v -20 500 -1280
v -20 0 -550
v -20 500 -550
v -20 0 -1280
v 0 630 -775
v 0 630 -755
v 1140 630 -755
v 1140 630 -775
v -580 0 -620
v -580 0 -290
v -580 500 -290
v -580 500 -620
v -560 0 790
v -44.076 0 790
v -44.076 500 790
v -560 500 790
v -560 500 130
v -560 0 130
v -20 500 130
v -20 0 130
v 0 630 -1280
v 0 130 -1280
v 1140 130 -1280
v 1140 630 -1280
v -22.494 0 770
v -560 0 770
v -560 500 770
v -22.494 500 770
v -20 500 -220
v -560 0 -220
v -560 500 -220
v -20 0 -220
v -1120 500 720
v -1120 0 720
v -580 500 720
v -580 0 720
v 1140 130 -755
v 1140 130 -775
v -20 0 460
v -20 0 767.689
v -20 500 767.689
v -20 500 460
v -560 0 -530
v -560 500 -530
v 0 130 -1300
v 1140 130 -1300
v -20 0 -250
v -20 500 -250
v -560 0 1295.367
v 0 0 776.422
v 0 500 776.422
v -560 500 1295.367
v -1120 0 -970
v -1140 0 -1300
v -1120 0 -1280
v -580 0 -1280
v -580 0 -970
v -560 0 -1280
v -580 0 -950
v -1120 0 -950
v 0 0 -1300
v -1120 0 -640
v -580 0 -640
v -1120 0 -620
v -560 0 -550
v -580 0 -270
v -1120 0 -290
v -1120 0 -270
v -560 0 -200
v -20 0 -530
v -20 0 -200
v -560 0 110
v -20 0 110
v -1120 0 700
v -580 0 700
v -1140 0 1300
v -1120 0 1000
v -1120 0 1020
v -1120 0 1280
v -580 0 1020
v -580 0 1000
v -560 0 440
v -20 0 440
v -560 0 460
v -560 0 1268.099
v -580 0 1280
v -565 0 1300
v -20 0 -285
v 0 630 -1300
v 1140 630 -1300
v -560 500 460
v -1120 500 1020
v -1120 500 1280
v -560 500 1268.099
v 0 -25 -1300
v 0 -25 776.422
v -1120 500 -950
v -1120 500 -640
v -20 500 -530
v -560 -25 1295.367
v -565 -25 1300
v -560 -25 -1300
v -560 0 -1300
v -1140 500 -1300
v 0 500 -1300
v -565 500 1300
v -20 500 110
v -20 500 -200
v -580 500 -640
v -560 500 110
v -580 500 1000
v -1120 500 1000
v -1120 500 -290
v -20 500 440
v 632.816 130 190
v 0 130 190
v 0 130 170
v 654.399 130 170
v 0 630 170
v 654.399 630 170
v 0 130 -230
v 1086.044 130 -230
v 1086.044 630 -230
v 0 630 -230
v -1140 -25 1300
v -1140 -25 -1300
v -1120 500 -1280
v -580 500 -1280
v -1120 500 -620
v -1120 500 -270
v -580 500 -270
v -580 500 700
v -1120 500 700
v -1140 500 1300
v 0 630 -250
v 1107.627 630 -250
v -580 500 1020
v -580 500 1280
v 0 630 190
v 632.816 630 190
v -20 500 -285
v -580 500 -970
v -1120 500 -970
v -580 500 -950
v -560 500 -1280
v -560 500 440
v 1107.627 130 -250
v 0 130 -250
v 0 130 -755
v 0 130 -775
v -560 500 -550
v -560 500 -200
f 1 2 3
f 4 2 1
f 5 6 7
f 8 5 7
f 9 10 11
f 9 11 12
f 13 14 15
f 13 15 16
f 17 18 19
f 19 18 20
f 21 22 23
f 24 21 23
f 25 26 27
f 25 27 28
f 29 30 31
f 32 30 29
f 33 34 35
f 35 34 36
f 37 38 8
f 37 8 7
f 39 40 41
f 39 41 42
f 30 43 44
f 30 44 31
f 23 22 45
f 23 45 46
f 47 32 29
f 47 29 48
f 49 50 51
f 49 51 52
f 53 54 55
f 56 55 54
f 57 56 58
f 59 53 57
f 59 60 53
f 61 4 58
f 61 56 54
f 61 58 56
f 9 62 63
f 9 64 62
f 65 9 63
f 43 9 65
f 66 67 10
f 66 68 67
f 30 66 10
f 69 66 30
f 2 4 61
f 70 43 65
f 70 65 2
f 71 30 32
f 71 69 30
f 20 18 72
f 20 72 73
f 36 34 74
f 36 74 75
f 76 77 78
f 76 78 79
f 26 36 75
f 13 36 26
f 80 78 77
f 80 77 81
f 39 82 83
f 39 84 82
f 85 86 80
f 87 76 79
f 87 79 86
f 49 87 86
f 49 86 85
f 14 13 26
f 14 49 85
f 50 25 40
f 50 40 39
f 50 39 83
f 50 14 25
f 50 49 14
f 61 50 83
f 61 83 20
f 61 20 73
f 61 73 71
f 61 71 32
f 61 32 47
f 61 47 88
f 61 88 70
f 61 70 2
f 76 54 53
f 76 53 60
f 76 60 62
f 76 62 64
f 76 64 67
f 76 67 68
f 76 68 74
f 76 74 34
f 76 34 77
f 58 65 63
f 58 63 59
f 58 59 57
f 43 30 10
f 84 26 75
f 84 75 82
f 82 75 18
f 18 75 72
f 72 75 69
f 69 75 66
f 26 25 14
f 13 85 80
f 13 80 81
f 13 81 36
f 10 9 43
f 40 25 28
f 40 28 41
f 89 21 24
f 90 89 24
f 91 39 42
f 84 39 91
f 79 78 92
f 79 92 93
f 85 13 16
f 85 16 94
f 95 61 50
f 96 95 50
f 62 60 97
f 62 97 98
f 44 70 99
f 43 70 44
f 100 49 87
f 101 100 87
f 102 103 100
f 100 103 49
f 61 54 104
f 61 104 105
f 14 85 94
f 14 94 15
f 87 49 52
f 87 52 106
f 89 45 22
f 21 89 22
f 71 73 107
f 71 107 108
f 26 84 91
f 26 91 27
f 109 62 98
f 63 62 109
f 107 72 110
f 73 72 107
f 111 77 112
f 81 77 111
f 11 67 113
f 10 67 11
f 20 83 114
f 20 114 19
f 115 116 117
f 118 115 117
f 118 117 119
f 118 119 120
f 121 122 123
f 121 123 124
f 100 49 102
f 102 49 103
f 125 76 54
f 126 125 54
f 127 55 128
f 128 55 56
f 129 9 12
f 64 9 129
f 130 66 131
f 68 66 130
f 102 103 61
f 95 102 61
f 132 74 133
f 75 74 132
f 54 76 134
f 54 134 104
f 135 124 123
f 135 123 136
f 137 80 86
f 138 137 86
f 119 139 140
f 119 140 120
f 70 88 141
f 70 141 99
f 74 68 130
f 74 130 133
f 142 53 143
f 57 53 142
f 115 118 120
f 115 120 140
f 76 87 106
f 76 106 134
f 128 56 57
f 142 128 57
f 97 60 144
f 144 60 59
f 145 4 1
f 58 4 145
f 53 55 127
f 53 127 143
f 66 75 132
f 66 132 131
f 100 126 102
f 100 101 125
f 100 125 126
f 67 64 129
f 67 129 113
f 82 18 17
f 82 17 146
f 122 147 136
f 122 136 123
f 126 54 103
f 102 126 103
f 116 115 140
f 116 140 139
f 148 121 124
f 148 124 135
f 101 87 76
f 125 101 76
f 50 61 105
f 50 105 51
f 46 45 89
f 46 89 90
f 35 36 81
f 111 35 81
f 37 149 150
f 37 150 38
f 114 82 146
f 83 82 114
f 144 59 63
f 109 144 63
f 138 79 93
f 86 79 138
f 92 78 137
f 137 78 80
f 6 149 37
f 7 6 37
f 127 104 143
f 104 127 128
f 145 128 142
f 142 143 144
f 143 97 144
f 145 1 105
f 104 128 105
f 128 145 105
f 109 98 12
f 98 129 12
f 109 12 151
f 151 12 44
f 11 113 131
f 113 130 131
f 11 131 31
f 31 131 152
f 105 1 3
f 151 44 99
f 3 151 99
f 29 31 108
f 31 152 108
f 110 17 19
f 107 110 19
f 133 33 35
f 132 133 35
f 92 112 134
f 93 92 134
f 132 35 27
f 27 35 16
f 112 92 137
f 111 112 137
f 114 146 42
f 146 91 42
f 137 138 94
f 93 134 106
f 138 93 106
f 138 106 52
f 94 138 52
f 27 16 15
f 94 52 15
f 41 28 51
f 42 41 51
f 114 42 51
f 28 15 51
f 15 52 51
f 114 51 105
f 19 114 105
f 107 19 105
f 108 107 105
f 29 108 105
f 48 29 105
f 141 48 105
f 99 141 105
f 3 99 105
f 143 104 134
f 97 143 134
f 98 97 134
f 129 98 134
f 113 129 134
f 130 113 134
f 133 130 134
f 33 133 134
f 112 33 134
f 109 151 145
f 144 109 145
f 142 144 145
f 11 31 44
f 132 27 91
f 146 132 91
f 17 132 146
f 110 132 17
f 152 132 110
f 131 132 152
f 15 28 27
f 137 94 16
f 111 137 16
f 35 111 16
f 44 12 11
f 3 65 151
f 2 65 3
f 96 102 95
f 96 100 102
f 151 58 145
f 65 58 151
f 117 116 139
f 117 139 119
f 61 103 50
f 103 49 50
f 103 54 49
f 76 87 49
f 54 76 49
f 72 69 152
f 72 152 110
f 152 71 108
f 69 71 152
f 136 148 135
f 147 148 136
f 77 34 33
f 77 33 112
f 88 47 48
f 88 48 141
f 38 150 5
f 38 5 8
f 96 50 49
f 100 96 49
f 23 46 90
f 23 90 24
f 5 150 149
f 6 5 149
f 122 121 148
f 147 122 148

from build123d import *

# Parameters (mm, degrees)
F0_W     = 540
F0_H     = 310
F0_H_2   = 280
F0_H_3   = 260
F0_H_4   = 20
F1_DEPTH = 500
F0_H_5   = 920
F0_H_6   = 275
F0_H_7   = 35
F0_H_8   = 30
F2_DEPTH = 25
F0_H_9   = 250
F0_H_10  = 230
F3_DEPTH = 25
F4_START = -130
F4_DEPTH = 500
F0_W_2   = 1140
F0_H_11  = 20.0000000002


# Not quite as in the source:
# - a feature names something its author has since deleted; it is built from what else it names


with BuildPart() as f1:
    # F0 (on Front) → F1 (new body)
    with BuildSketch(Plane.XZ):
        Polygon((-1140, -1300), (-560, -1300), (-560, -1280), (-560, -1050), (-560, -800), (-560, -550), (-560, -530), (-560, -220), (-560, -200), (-560, 110), (-560, 130), (-560, 440), (-560, 460), (-560, 770), (-560, 790), (-560, 1268.0993919815), (-560, 1295.366568915), (-565, 1300), (-1140, 1300), align=None)
        with Locations((-850, -1125)):
            Rectangle(F0_W, F0_H, mode=Mode.SUBTRACT)
        with Locations((-850, -795)):
            Rectangle(F0_W, F0_H, mode=Mode.SUBTRACT)
        Polygon((-580, -290), (-580, -325), (-580, -345), (-580, -620), (-1120, -620), (-1120, -345), (-1120, -325), (-1120, -290), align=None, mode=Mode.SUBTRACT)
        Polygon((-1120, 700), (-580, 700), (-580, 670), (-580, 650), (-580, -270), (-1120, -270), (-1120, 650), (-1120, 670), align=None, mode=Mode.SUBTRACT)
        with Locations((-850, 860)):
            Rectangle(F0_W, F0_H_2, mode=Mode.SUBTRACT)
        with Locations((-850, 1150)):
            Rectangle(F0_W, F0_H_3, mode=Mode.SUBTRACT)
        Polygon((-20.0000000001, -250), (0, -250), (0, -230), (0, 170), (0, 190), (0, 776.4222873899), (-560, 1295.366568915), (-560, 1268.0993919815), (-44.0762890327, 790), (-560, 790), (-560, 770), (-22.4940105517, 770), (-20, 767.6888347967), (-20, 720), (-20, 700), (-20, 460), (-560, 460), (-560, 440), (-20, 440), (-20, 374.9999928474), (-20, 354.9999928474), (-20, 130), (-20, 110), (-20, -200), (-560, -200), (-560, -220), (-20, -220), align=None)
        with Locations((-290, 120)):
            Rectangle(F0_W, F0_H_4)
        Polygon((-560, -1300), (0, -1300), (0, -1280), (0, -775), (0, -755), (0, -250), (-20.0000000001, -250), (-20, -285.0000071528), (-20, -305.0000071528), (-20, -530), (-560, -530), (-560, -550), (-20, -550), (-20, -800), (-20, -1050), (-20, -1280), (-560, -1280), align=None)
    extrude(amount=-F1_DEPTH)


with BuildPart() as f2:
    # F0 (on Front) → F2 (new body)
    with BuildSketch(Plane.XZ):
        Polygon((-1140, -1300), (-560, -1300), (-560, -1280), (-560, -1050), (-560, -800), (-560, -550), (-560, -530), (-560, -220), (-560, -200), (-560, 110), (-560, 130), (-560, 440), (-560, 460), (-560, 770), (-560, 790), (-560, 1268.0993919815), (-560, 1295.366568915), (-565, 1300), (-1140, 1300), align=None)
        with Locations((-850, -1125)):
            Rectangle(F0_W, F0_H, mode=Mode.SUBTRACT)
        with Locations((-850, -795)):
            Rectangle(F0_W, F0_H, mode=Mode.SUBTRACT)
        Polygon((-580, -290), (-580, -325), (-580, -345), (-580, -620), (-1120, -620), (-1120, -345), (-1120, -325), (-1120, -290), align=None, mode=Mode.SUBTRACT)
        Polygon((-1120, 700), (-580, 700), (-580, 670), (-580, 650), (-580, -270), (-1120, -270), (-1120, 650), (-1120, 670), align=None, mode=Mode.SUBTRACT)
        with Locations((-850, 860)):
            Rectangle(F0_W, F0_H_2, mode=Mode.SUBTRACT)
        with Locations((-850, 1150)):
            Rectangle(F0_W, F0_H_3, mode=Mode.SUBTRACT)
        with Locations((-850, 190)):
            Rectangle(F0_W, F0_H_5)
        with Locations((-850, -795)):
            Rectangle(F0_W, F0_H)
        with Locations((-850, -1125)):
            Rectangle(F0_W, F0_H)
        with Locations((-850, 860)):
            Rectangle(F0_W, F0_H_2)
        with Locations((-850, -482.5)):
            Rectangle(F0_W, F0_H_6)
        with Locations((-850, 1150)):
            Rectangle(F0_W, F0_H_3)
        with Locations((-850, -307.5)):
            Rectangle(F0_W, F0_H_7)
        with Locations((-850, 685)):
            Rectangle(F0_W, F0_H_8)
        with Locations((-850, 660)):
            Rectangle(F0_W, F0_H_4)
        with Locations((-850, -335)):
            Rectangle(F0_W, F0_H_4)
    extrude(amount=F2_DEPTH)


with BuildPart() as f3:
    # F0 (on Front) → F3 (new body)
    with BuildSketch(Plane.XZ):
        Polygon((-44.0762890327, 790), (-560, 1268.0993919815), (-560, 790), align=None)
        Polygon((-560, -1300), (0, -1300), (0, -1280), (0, -775), (0, -755), (0, -250), (-20.0000000001, -250), (-20, -285.0000071528), (-20, -305.0000071528), (-20, -530), (-560, -530), (-560, -550), (-20, -550), (-20, -800), (-20, -1050), (-20, -1280), (-560, -1280), align=None)
        with Locations((-290, -675)):
            Rectangle(F0_W, F0_H_9)
        with Locations((-290, -925)):
            Rectangle(F0_W, F0_H_9)
        with Locations((-290, -1165)):
            Rectangle(F0_W, F0_H_10)
        Polygon((-20, -285.0000071528), (-20, -250), (-20, -220), (-560, -220), (-560, -530), (-20, -530), (-20, -305.0000071528), align=None)
        Polygon((-20.0000000001, -250), (0, -250), (0, -230), (0, 170), (0, 190), (0, 776.4222873899), (-560, 1295.366568915), (-560, 1268.0993919815), (-44.0762890327, 790), (-560, 790), (-560, 770), (-22.4940105517, 770), (-20, 767.6888347967), (-20, 720), (-20, 700), (-20, 460), (-560, 460), (-560, 440), (-20, 440), (-20, 374.9999928474), (-20, 354.9999928474), (-20, 130), (-20, 110), (-20, -200), (-560, -200), (-560, -220), (-20, -220), align=None)
        with Locations((-290, -45)):
            Rectangle(F0_W, F0_H)
        with Locations((-290, 120)):
            Rectangle(F0_W, F0_H_4)
        Polygon((-20, 440), (-560, 440), (-560, 130), (-20, 130), (-20, 354.9999928474), (-20, 374.9999928474), align=None)
        Polygon((-22.4940105517, 770), (-560, 770), (-560, 460), (-20, 460), (-20, 700), (-20, 720), (-20, 767.6888347967), align=None)
    extrude(amount=F3_DEPTH)


with BuildPart() as f4:
    # F0 (on Front) → F4 (new body)
    with BuildSketch(Plane.XZ.offset(F4_START)):
        Polygon((0, 190), (0, 170), (654.3987341771, 169.9999999999), (632.8164556961, 189.9999999999), align=None)
    extrude(amount=-F4_DEPTH)


with BuildPart() as f4b:
    # F0 (on Front) → F4, piece 2 (new body)
    with BuildSketch(Plane.XZ.offset(F4_START)):
        Polygon((0, -230), (0, -250), (1107.6265822783, -250.0000000001), (1086.0443037973, -230.0000000001), align=None)
    extrude(amount=-F4_DEPTH)


with BuildPart() as f4c:
    # F0 (on Front) → F4, piece 3 (new body)
    with BuildSketch(Plane.XZ.offset(F4_START)):
        with Locations((570, -765.0000000001)):
            Rectangle(F0_W_2, F0_H_11)
    extrude(amount=-F4_DEPTH)


with BuildPart() as f4d:
    # F0 (on Front) → F4, piece 4 (new body)
    with BuildSketch(Plane.XZ.offset(F4_START)):
        with Locations((570, -1290)):
            Rectangle(F0_W_2, F0_H_4)
    extrude(amount=-F4_DEPTH)


solid = Compound([f1.part, f2.part, f3.part, f4.part, f4b.part, f4c.part, f4d.part])
